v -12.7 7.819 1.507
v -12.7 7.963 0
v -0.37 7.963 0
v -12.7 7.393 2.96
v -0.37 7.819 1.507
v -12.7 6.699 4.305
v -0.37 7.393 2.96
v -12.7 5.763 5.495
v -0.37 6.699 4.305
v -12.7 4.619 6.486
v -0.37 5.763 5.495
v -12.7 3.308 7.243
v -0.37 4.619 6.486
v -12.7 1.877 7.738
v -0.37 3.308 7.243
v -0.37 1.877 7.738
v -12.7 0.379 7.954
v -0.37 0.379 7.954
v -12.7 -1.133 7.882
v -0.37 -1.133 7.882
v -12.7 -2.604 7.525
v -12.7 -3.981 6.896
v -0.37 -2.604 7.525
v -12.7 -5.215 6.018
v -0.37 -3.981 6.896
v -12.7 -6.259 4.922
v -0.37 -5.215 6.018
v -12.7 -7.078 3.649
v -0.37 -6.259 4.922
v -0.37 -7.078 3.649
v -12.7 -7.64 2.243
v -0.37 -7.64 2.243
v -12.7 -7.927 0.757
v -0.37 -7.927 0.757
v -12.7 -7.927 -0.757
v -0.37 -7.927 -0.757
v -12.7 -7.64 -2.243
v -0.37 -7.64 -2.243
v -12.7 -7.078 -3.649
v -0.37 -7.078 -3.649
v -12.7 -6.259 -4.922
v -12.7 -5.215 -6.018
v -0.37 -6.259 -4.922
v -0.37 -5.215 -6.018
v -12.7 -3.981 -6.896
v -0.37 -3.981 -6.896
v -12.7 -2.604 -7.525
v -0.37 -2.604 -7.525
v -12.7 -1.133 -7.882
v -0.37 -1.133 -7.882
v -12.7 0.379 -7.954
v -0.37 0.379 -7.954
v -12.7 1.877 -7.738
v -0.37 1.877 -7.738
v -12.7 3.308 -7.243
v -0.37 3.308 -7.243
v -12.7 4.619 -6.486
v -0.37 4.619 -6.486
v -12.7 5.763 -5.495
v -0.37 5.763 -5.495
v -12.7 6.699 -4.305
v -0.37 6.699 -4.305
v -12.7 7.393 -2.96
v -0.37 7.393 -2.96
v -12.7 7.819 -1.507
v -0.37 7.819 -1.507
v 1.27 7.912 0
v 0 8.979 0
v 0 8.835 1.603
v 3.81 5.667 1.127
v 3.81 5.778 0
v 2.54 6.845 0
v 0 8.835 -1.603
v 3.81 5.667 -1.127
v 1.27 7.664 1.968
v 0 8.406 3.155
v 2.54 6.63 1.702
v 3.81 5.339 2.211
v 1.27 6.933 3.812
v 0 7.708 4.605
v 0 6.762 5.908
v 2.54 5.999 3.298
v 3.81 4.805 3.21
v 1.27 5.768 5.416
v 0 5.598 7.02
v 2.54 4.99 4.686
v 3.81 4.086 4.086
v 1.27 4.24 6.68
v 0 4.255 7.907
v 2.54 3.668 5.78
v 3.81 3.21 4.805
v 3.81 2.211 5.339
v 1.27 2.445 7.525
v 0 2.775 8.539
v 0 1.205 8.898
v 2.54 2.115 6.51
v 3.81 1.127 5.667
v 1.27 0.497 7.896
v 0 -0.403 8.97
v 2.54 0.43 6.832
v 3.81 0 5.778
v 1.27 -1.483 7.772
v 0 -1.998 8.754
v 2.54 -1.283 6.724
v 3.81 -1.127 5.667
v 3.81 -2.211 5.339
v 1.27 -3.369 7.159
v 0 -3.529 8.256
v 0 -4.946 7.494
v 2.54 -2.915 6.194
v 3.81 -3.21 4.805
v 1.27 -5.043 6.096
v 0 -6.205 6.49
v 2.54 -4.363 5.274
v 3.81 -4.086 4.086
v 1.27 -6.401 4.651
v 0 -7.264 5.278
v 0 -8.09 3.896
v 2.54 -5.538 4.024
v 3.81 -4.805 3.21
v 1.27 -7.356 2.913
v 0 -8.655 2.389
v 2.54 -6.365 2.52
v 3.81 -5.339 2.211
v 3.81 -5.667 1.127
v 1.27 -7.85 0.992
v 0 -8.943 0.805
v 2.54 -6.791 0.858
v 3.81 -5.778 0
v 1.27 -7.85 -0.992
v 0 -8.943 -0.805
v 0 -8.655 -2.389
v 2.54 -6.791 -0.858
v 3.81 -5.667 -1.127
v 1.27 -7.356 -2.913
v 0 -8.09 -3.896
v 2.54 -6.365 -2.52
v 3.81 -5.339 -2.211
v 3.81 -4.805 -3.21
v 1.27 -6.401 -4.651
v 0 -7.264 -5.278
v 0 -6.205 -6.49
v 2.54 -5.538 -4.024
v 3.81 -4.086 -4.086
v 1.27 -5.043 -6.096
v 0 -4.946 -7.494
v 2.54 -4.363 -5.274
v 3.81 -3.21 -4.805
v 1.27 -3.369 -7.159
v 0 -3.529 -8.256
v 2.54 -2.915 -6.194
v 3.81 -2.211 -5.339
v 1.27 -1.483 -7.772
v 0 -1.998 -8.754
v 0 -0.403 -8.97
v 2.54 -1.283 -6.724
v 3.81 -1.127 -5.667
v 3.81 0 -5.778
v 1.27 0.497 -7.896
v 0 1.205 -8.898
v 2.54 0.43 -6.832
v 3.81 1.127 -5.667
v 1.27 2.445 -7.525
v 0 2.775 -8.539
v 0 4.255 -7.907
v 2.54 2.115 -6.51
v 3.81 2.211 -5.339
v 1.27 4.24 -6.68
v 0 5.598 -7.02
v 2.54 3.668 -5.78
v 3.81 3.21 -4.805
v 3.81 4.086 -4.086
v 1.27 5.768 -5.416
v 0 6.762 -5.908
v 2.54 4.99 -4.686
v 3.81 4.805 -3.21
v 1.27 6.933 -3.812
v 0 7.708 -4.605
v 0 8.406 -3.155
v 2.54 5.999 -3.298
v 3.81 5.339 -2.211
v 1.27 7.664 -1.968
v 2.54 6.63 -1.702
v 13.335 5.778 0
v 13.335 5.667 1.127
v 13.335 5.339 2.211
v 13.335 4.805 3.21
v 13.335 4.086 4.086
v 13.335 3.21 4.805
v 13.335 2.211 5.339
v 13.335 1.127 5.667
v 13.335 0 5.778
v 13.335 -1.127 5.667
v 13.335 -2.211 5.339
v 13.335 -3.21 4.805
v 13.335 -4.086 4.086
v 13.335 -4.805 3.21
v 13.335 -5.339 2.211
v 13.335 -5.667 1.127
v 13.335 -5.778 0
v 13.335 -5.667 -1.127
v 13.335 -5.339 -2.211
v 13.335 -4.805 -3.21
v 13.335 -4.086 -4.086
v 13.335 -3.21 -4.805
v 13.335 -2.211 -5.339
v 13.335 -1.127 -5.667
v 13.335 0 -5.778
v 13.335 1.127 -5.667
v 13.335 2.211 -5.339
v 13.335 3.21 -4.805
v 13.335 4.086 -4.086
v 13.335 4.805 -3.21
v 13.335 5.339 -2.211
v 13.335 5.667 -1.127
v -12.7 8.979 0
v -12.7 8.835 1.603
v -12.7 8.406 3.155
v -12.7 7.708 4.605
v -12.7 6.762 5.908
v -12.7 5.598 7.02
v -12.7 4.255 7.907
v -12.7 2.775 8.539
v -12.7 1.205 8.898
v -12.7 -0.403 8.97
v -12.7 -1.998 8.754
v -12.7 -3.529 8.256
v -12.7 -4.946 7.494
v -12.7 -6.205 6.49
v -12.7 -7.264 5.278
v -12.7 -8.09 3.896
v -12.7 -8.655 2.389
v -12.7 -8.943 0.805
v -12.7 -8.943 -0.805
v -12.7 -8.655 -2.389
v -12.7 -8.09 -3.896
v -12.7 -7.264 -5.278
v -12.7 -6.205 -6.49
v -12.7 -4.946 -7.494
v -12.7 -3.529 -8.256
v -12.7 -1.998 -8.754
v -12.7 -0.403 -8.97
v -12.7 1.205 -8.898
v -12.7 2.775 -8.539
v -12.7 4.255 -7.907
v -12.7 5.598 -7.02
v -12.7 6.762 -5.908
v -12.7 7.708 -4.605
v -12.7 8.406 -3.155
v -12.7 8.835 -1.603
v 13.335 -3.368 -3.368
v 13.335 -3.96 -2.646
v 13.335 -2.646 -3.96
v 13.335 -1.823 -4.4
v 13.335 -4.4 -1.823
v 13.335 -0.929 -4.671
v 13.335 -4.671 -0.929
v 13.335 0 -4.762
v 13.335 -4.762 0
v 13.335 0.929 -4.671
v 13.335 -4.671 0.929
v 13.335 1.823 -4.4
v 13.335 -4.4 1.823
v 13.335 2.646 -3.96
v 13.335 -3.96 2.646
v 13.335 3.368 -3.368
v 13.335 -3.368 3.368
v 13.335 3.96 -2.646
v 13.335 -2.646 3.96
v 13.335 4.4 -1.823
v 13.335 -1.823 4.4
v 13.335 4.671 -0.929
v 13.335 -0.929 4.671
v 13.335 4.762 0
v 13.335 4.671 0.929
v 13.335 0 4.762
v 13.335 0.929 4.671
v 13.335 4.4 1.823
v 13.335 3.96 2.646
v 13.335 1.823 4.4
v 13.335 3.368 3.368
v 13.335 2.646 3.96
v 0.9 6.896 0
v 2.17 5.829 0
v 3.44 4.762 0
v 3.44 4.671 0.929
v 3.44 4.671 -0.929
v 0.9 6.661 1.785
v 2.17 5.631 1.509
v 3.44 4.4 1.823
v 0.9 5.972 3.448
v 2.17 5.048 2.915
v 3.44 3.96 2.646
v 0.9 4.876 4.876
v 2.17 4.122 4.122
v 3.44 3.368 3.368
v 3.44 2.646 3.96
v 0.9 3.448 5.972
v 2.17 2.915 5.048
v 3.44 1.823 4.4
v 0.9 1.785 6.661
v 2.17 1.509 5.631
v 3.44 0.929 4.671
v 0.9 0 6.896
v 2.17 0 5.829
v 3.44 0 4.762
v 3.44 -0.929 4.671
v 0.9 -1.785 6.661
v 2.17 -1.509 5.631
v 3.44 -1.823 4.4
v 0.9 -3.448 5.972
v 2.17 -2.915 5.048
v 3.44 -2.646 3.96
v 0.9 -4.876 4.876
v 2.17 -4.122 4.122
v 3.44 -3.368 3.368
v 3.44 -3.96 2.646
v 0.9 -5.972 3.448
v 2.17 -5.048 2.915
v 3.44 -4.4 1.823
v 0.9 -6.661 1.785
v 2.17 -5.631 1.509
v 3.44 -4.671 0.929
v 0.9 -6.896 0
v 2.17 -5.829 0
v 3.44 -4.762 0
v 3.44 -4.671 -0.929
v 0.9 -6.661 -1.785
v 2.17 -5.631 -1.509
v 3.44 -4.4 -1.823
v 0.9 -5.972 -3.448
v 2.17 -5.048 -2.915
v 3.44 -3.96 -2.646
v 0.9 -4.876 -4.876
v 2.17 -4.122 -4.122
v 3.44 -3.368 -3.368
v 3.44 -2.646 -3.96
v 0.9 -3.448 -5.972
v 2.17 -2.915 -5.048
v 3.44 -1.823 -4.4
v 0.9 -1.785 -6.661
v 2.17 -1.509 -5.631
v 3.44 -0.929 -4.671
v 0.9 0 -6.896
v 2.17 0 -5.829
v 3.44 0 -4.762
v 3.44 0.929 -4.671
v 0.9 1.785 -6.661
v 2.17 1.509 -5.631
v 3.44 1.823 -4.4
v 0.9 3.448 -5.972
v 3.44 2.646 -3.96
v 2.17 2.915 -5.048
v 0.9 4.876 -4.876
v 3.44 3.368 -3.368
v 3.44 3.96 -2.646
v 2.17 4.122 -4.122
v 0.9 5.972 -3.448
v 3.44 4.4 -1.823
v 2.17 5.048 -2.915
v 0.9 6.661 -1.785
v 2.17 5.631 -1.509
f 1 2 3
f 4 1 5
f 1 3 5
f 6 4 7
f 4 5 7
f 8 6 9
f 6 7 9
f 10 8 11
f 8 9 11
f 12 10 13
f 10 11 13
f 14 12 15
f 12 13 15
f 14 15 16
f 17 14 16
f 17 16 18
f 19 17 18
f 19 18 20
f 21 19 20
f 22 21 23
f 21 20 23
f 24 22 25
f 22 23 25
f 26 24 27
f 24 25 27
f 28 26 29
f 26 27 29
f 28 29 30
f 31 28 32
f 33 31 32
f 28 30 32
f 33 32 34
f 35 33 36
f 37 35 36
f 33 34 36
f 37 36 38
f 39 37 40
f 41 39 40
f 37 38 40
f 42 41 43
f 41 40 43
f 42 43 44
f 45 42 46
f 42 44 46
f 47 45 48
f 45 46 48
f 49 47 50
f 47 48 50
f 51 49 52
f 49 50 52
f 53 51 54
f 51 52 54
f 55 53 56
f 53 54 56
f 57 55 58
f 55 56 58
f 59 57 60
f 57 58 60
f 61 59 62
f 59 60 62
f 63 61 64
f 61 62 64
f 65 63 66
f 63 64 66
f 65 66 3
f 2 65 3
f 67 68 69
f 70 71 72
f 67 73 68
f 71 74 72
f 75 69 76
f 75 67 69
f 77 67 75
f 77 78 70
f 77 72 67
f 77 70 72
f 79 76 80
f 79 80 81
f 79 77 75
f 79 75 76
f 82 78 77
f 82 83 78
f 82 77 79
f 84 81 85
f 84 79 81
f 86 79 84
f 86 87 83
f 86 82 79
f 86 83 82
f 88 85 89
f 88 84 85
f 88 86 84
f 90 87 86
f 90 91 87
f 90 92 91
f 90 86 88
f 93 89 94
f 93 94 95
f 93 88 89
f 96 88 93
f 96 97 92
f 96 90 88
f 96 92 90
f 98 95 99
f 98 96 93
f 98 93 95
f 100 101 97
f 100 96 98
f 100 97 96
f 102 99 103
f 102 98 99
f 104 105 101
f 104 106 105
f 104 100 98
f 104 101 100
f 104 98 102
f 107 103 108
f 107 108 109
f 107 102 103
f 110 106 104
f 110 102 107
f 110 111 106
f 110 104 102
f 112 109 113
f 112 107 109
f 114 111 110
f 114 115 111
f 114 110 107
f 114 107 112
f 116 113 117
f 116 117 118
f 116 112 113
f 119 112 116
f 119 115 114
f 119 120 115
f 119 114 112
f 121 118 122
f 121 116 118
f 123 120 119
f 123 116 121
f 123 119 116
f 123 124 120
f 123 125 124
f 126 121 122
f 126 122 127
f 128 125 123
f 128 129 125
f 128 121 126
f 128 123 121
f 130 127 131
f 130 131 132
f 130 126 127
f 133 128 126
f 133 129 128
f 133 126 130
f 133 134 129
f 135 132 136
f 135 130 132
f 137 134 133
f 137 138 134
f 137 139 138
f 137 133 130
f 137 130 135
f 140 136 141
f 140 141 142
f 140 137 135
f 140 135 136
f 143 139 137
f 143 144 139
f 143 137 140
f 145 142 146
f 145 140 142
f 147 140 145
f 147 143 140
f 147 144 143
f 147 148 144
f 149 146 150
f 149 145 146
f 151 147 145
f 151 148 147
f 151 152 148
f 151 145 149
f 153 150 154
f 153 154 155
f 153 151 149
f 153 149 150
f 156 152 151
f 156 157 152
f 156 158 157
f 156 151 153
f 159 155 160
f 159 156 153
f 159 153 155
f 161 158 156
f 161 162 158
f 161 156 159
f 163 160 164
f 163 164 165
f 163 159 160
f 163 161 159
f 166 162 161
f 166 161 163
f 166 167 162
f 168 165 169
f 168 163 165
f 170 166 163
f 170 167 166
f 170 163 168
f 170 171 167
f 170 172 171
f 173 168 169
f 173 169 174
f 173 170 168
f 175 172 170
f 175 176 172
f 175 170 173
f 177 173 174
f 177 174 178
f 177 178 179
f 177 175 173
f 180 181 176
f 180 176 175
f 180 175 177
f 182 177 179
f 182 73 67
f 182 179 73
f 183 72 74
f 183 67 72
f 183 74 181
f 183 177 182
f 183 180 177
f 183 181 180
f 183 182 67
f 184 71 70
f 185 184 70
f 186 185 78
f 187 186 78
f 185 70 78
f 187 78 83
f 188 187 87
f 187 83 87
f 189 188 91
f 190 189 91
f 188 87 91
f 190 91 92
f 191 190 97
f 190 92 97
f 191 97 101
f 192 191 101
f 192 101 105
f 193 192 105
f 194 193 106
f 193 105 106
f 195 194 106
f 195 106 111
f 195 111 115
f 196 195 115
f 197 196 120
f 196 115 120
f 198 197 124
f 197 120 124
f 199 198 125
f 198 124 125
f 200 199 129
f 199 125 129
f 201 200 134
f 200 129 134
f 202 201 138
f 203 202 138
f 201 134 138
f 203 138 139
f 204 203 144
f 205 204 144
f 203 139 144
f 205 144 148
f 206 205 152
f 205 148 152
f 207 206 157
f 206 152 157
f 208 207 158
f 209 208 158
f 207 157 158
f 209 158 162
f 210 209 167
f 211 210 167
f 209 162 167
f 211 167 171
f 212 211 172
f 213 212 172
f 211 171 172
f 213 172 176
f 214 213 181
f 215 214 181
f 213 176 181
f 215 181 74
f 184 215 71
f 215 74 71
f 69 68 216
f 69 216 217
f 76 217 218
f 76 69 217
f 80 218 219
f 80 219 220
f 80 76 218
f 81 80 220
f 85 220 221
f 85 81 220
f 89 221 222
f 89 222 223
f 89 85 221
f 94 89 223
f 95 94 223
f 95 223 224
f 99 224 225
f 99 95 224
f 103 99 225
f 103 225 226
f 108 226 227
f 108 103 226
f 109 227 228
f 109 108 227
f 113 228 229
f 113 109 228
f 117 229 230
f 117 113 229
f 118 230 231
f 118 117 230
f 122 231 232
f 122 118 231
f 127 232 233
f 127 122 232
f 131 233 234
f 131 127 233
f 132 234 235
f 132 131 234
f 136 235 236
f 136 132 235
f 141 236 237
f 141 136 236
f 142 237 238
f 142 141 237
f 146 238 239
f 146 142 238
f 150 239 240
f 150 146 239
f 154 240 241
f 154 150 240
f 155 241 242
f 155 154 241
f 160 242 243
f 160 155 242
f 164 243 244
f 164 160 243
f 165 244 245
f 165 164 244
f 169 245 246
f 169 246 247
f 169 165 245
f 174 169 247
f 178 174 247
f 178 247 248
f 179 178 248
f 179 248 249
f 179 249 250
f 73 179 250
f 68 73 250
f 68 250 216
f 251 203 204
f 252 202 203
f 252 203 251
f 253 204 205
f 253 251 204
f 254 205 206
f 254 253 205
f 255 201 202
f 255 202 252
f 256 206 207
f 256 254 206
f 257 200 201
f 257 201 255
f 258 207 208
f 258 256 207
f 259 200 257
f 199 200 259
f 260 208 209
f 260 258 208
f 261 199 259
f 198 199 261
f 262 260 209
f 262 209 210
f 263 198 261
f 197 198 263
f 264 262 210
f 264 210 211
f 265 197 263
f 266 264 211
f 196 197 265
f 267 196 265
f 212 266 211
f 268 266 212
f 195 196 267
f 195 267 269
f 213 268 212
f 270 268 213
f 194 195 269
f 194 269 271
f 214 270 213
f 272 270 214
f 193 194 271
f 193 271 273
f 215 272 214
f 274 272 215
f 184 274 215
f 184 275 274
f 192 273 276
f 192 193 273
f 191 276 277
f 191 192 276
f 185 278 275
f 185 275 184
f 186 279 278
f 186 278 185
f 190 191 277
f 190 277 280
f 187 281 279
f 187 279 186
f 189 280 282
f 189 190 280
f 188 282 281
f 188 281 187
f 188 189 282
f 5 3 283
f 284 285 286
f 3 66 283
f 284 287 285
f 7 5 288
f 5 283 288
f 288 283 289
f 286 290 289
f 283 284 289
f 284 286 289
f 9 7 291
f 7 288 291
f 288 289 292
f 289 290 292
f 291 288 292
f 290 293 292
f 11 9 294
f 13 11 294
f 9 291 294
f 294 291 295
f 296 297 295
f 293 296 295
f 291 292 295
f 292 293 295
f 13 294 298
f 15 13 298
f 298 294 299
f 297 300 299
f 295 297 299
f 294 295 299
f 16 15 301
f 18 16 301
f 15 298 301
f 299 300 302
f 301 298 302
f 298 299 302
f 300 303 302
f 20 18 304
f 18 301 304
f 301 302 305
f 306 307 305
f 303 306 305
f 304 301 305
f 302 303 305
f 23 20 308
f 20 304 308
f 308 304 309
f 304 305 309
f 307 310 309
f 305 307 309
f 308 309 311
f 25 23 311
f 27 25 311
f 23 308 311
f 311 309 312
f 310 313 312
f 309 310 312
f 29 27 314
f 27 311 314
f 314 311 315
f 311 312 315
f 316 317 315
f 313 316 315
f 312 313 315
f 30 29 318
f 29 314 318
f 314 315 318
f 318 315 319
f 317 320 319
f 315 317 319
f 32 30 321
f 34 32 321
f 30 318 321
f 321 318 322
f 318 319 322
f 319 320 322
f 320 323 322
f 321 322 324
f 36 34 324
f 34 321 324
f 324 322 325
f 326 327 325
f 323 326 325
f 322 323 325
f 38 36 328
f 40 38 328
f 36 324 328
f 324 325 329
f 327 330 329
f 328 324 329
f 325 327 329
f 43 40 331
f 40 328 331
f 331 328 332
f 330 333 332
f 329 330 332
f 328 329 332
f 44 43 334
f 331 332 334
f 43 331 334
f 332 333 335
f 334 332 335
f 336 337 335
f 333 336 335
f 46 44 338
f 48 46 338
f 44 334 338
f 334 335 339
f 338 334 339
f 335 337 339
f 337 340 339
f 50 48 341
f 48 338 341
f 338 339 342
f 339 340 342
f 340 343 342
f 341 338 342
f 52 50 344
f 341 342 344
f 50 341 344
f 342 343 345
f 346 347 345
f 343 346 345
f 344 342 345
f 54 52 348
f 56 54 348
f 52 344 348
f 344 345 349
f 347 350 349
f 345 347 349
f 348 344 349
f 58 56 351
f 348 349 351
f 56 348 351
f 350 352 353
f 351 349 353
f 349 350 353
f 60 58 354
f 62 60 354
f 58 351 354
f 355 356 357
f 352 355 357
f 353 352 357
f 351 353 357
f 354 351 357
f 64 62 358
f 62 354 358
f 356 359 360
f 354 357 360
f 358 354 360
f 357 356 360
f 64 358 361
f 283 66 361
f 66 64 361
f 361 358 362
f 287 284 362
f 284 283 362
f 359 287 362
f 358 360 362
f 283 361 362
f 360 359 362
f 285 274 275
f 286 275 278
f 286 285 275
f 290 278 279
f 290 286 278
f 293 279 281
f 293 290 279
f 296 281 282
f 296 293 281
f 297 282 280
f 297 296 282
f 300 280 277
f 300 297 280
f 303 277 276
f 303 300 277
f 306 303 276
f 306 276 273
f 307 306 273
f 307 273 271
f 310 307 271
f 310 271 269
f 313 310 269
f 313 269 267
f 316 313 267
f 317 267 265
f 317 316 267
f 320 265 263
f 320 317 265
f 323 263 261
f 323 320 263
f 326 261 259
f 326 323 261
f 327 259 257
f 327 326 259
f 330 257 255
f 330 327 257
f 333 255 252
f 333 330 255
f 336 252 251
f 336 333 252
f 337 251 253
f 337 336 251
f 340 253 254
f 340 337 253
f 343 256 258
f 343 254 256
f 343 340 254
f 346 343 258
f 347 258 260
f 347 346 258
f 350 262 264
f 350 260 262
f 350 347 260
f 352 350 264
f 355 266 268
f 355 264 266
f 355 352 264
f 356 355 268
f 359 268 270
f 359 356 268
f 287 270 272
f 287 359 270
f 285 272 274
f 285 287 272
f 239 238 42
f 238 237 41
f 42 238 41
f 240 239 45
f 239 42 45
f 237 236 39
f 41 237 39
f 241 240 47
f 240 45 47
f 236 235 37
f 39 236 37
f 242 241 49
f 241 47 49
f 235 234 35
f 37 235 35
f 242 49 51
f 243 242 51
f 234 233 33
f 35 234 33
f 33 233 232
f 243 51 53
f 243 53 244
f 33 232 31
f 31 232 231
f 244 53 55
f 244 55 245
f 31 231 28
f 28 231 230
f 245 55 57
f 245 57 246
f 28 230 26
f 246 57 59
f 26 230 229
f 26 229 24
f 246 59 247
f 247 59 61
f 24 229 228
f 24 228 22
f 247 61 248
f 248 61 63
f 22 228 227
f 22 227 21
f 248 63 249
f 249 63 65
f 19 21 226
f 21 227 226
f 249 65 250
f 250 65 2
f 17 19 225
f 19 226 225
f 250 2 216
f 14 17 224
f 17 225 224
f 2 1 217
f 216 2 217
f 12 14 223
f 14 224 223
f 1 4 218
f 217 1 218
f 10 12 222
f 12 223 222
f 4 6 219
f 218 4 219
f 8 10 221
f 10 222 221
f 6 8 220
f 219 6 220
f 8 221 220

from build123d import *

# Parameters (mm, degrees)
F0_R      = 8.9789
F1_DEPTH  = 12.7
F3_R      = 5.7785
F4_DEPTH  = 9.525
F1_FACE_R = 8.9789
F4_FACE_R = 5.7785
F6_T      = -1.016


with BuildPart() as f1:
    # F0 (on Right) → F1 (new body)
    with BuildSketch(Plane.YZ):
        Circle(F0_R)
    extrude(amount=-F1_DEPTH)



with BuildPart() as f4:
    # F3 (on offset) → F4 (new body)
    with BuildSketch(Plane.YZ.offset(3.81)):
        Circle(F3_R)
    extrude(amount=F4_DEPTH)


with BuildPart() as f1_1:
    add(f1.part)

    add(f4.part)  # F5 merges F4
    # F1_face (on face) → F5 section 0
    with BuildSketch(Plane.YZ):
        Circle(F1_FACE_R)
    # F4_face (on face) → F5 section 1
    with BuildSketch(Plane(origin=(3.81, 0, 0), x_dir=(0, 1, 0), z_dir=(-1, 0, 0))):
        Circle(F4_FACE_R)
    loft()

    # F6
    f6_openings = [f1_1.faces().sort_by_distance(p)[0] for p in [
        (13.335, 0, 0),
        (-12.7, 0, 0),
    ]]
    offset(amount=F6_T, openings=f6_openings, kind=Kind.INTERSECTION)


solid = f1_1.part
